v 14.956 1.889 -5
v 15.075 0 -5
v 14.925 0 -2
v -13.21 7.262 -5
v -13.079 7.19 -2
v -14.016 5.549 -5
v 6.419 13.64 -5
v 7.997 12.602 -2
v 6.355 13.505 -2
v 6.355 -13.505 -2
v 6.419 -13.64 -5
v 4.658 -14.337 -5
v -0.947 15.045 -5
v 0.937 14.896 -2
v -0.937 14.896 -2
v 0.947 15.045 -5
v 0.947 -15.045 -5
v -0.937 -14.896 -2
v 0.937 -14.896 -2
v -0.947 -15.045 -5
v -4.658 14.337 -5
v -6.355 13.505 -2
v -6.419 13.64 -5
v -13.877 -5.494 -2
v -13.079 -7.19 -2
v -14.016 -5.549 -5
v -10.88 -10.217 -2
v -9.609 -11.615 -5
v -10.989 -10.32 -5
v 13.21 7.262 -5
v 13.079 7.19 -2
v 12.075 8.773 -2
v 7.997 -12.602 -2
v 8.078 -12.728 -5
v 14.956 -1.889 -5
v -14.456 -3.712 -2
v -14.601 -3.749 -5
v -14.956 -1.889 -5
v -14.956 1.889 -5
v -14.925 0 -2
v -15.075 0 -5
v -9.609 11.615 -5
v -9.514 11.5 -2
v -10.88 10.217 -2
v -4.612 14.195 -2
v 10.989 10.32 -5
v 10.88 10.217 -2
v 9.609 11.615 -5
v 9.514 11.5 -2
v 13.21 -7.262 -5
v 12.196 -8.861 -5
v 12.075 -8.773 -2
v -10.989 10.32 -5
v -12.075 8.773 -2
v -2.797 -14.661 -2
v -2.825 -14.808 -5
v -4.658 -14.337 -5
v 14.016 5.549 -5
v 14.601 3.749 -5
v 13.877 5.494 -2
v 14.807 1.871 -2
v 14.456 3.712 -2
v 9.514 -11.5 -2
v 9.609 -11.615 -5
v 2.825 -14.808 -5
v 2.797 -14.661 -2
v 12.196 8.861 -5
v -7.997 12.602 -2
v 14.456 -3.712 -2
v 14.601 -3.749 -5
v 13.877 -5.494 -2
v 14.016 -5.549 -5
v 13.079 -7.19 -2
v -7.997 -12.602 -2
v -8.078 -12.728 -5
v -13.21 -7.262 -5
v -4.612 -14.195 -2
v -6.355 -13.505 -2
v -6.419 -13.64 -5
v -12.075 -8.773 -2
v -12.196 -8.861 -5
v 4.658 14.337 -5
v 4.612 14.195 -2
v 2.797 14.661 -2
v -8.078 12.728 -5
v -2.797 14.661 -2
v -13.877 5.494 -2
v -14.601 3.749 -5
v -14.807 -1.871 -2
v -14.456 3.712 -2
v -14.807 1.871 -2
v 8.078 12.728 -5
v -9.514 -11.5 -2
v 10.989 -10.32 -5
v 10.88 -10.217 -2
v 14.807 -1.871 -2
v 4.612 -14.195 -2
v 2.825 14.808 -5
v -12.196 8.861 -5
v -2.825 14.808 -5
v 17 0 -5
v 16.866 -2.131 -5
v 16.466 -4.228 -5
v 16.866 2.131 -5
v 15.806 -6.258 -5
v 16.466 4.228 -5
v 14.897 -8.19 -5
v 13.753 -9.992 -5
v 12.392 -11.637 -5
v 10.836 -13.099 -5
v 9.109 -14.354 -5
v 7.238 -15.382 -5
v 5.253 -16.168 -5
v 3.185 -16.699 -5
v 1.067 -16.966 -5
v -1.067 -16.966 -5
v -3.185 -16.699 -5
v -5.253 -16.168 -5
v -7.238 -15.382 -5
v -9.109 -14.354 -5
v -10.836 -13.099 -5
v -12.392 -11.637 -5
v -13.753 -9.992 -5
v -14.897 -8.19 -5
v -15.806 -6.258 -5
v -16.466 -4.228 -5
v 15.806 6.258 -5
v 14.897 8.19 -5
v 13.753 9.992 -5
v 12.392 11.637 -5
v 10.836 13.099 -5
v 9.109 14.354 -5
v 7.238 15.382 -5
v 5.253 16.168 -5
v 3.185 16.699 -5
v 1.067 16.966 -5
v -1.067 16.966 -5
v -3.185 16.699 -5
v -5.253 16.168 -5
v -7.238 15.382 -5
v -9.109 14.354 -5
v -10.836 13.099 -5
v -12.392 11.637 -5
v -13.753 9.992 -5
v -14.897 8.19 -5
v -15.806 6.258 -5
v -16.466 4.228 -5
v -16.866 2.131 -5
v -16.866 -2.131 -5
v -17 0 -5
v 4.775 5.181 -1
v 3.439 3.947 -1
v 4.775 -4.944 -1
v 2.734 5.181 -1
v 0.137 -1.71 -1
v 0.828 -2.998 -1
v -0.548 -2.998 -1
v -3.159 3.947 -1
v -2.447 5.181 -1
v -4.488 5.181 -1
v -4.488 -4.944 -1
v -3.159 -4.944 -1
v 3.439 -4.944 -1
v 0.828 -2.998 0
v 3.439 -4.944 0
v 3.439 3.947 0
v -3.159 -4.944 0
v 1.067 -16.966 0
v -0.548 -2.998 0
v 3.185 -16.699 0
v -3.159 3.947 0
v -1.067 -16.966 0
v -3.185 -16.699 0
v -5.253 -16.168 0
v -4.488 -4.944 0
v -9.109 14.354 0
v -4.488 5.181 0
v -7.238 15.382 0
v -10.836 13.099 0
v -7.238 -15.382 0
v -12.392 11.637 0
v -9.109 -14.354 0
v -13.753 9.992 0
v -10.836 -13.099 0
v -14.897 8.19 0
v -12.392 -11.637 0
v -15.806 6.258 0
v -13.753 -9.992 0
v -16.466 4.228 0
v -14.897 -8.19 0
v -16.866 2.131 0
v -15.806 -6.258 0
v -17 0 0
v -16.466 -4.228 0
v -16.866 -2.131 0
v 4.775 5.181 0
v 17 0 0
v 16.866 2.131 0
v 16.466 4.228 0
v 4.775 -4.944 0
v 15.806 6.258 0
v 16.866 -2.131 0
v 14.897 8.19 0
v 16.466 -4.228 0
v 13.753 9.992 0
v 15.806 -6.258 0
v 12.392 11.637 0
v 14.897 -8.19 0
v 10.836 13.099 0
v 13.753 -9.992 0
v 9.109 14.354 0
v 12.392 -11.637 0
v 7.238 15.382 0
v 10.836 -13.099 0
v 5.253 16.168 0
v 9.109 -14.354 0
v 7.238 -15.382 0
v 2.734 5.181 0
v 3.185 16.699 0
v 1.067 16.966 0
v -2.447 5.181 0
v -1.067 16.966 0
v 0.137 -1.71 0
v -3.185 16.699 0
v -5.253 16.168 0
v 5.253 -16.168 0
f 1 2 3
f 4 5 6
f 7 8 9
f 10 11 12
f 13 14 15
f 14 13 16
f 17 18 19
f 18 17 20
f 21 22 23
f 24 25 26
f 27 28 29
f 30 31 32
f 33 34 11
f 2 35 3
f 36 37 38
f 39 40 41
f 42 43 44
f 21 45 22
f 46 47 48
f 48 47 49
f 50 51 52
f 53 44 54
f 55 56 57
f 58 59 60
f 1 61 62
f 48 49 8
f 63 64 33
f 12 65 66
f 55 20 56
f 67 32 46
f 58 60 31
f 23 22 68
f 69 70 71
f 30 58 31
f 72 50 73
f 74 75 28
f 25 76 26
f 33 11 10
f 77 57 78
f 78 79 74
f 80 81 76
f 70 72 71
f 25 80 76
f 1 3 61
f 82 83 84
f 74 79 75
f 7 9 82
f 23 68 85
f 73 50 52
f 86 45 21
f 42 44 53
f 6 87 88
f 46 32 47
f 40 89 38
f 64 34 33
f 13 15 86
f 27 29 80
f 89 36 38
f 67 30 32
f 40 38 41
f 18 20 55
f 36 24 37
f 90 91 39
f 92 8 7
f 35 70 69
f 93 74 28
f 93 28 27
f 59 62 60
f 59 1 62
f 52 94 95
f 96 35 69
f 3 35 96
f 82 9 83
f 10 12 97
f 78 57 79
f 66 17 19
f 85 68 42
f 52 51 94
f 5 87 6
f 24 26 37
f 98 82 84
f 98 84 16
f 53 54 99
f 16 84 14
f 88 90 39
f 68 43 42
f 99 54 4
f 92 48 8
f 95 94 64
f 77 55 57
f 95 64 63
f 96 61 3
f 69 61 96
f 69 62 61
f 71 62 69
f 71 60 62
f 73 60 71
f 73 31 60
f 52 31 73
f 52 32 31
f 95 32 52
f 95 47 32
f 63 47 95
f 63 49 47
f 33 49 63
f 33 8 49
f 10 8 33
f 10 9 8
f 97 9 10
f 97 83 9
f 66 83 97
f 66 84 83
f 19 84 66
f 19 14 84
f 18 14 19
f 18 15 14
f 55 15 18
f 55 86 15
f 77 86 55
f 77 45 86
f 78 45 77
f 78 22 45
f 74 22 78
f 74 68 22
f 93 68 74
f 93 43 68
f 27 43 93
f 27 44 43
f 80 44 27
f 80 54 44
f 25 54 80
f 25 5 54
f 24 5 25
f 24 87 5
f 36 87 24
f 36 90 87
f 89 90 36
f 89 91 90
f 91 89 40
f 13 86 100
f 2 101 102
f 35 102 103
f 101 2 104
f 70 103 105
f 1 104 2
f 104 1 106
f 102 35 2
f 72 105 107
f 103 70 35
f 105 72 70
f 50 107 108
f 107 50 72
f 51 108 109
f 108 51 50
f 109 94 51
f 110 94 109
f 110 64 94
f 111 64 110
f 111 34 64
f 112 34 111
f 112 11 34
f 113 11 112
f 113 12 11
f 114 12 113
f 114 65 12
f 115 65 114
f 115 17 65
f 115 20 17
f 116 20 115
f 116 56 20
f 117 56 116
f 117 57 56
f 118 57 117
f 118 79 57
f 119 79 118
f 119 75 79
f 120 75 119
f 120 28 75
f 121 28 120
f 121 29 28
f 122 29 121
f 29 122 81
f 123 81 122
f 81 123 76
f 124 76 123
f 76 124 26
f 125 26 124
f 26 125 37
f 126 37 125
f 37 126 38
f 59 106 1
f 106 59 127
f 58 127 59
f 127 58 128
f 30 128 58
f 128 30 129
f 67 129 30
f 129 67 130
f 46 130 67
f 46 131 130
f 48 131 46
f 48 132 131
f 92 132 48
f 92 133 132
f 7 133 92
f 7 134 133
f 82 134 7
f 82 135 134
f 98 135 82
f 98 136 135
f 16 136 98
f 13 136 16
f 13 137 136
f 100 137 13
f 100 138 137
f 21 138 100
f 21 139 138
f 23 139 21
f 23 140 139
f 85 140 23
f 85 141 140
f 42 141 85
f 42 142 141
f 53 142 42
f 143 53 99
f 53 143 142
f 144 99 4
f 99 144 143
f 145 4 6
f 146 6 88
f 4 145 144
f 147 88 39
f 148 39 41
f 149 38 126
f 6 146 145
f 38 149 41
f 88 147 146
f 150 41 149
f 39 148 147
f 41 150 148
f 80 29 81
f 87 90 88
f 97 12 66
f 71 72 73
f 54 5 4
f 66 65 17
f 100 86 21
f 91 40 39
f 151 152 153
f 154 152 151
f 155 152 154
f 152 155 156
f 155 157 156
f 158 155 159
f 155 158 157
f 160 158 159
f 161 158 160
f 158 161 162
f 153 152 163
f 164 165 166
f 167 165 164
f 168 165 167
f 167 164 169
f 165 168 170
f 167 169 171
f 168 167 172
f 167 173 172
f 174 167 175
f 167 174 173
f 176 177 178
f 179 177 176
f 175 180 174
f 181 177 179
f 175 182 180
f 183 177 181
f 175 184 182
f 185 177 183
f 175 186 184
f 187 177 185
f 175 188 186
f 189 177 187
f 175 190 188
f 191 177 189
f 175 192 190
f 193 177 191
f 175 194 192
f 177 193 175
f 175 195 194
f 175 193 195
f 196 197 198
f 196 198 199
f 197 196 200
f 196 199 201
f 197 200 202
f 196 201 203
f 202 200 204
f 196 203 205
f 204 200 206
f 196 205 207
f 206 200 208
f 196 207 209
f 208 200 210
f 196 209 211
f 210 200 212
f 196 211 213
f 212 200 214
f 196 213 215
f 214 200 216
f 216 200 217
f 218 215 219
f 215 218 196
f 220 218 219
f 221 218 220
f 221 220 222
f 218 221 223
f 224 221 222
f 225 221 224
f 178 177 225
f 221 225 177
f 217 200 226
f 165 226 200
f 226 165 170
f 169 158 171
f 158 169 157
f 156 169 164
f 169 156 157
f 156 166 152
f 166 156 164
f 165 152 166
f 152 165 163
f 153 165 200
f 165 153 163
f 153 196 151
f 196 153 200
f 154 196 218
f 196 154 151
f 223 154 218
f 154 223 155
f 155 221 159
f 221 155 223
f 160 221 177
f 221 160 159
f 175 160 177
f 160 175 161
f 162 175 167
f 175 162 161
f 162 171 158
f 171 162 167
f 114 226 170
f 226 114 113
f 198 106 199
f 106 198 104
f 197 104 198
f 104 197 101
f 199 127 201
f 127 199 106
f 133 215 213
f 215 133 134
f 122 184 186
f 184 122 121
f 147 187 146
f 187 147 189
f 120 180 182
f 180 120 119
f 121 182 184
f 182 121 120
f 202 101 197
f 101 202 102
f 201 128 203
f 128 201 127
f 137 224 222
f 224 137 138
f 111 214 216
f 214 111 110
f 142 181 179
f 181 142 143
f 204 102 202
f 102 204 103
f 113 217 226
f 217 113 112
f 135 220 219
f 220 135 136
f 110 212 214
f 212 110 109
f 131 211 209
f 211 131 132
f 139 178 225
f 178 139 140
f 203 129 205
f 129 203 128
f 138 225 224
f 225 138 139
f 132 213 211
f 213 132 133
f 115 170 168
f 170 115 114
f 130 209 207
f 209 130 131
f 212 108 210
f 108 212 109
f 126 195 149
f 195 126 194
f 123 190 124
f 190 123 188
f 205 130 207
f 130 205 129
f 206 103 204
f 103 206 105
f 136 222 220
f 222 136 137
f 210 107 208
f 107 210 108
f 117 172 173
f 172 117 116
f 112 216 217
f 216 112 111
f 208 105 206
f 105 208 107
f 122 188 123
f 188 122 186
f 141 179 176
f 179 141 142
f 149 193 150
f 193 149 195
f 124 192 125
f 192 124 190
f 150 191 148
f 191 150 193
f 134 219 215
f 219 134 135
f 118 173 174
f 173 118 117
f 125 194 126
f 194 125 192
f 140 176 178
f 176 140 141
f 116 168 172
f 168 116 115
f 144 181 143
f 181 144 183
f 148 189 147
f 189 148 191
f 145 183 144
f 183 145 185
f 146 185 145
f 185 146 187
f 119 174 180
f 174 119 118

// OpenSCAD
$fn = 50;

difference() {
	union() {
		translate(v = [0, 0, -5.0]) {
			cylinder(h = 5, r = 17.0);
		}
	}
	union() {
		#translate(v = [0, 0, -5.0]) {
			cylinder(h = 3, r1 = 15.075, r2 = 14.925);
		}
		translate(v = [0, 0, -1]) {
			linear_extrude(height = 1) {
				text(font = "Impact", halign = "center", size = 10, text = "M", valign = "center");
			}
		}
	}
}
